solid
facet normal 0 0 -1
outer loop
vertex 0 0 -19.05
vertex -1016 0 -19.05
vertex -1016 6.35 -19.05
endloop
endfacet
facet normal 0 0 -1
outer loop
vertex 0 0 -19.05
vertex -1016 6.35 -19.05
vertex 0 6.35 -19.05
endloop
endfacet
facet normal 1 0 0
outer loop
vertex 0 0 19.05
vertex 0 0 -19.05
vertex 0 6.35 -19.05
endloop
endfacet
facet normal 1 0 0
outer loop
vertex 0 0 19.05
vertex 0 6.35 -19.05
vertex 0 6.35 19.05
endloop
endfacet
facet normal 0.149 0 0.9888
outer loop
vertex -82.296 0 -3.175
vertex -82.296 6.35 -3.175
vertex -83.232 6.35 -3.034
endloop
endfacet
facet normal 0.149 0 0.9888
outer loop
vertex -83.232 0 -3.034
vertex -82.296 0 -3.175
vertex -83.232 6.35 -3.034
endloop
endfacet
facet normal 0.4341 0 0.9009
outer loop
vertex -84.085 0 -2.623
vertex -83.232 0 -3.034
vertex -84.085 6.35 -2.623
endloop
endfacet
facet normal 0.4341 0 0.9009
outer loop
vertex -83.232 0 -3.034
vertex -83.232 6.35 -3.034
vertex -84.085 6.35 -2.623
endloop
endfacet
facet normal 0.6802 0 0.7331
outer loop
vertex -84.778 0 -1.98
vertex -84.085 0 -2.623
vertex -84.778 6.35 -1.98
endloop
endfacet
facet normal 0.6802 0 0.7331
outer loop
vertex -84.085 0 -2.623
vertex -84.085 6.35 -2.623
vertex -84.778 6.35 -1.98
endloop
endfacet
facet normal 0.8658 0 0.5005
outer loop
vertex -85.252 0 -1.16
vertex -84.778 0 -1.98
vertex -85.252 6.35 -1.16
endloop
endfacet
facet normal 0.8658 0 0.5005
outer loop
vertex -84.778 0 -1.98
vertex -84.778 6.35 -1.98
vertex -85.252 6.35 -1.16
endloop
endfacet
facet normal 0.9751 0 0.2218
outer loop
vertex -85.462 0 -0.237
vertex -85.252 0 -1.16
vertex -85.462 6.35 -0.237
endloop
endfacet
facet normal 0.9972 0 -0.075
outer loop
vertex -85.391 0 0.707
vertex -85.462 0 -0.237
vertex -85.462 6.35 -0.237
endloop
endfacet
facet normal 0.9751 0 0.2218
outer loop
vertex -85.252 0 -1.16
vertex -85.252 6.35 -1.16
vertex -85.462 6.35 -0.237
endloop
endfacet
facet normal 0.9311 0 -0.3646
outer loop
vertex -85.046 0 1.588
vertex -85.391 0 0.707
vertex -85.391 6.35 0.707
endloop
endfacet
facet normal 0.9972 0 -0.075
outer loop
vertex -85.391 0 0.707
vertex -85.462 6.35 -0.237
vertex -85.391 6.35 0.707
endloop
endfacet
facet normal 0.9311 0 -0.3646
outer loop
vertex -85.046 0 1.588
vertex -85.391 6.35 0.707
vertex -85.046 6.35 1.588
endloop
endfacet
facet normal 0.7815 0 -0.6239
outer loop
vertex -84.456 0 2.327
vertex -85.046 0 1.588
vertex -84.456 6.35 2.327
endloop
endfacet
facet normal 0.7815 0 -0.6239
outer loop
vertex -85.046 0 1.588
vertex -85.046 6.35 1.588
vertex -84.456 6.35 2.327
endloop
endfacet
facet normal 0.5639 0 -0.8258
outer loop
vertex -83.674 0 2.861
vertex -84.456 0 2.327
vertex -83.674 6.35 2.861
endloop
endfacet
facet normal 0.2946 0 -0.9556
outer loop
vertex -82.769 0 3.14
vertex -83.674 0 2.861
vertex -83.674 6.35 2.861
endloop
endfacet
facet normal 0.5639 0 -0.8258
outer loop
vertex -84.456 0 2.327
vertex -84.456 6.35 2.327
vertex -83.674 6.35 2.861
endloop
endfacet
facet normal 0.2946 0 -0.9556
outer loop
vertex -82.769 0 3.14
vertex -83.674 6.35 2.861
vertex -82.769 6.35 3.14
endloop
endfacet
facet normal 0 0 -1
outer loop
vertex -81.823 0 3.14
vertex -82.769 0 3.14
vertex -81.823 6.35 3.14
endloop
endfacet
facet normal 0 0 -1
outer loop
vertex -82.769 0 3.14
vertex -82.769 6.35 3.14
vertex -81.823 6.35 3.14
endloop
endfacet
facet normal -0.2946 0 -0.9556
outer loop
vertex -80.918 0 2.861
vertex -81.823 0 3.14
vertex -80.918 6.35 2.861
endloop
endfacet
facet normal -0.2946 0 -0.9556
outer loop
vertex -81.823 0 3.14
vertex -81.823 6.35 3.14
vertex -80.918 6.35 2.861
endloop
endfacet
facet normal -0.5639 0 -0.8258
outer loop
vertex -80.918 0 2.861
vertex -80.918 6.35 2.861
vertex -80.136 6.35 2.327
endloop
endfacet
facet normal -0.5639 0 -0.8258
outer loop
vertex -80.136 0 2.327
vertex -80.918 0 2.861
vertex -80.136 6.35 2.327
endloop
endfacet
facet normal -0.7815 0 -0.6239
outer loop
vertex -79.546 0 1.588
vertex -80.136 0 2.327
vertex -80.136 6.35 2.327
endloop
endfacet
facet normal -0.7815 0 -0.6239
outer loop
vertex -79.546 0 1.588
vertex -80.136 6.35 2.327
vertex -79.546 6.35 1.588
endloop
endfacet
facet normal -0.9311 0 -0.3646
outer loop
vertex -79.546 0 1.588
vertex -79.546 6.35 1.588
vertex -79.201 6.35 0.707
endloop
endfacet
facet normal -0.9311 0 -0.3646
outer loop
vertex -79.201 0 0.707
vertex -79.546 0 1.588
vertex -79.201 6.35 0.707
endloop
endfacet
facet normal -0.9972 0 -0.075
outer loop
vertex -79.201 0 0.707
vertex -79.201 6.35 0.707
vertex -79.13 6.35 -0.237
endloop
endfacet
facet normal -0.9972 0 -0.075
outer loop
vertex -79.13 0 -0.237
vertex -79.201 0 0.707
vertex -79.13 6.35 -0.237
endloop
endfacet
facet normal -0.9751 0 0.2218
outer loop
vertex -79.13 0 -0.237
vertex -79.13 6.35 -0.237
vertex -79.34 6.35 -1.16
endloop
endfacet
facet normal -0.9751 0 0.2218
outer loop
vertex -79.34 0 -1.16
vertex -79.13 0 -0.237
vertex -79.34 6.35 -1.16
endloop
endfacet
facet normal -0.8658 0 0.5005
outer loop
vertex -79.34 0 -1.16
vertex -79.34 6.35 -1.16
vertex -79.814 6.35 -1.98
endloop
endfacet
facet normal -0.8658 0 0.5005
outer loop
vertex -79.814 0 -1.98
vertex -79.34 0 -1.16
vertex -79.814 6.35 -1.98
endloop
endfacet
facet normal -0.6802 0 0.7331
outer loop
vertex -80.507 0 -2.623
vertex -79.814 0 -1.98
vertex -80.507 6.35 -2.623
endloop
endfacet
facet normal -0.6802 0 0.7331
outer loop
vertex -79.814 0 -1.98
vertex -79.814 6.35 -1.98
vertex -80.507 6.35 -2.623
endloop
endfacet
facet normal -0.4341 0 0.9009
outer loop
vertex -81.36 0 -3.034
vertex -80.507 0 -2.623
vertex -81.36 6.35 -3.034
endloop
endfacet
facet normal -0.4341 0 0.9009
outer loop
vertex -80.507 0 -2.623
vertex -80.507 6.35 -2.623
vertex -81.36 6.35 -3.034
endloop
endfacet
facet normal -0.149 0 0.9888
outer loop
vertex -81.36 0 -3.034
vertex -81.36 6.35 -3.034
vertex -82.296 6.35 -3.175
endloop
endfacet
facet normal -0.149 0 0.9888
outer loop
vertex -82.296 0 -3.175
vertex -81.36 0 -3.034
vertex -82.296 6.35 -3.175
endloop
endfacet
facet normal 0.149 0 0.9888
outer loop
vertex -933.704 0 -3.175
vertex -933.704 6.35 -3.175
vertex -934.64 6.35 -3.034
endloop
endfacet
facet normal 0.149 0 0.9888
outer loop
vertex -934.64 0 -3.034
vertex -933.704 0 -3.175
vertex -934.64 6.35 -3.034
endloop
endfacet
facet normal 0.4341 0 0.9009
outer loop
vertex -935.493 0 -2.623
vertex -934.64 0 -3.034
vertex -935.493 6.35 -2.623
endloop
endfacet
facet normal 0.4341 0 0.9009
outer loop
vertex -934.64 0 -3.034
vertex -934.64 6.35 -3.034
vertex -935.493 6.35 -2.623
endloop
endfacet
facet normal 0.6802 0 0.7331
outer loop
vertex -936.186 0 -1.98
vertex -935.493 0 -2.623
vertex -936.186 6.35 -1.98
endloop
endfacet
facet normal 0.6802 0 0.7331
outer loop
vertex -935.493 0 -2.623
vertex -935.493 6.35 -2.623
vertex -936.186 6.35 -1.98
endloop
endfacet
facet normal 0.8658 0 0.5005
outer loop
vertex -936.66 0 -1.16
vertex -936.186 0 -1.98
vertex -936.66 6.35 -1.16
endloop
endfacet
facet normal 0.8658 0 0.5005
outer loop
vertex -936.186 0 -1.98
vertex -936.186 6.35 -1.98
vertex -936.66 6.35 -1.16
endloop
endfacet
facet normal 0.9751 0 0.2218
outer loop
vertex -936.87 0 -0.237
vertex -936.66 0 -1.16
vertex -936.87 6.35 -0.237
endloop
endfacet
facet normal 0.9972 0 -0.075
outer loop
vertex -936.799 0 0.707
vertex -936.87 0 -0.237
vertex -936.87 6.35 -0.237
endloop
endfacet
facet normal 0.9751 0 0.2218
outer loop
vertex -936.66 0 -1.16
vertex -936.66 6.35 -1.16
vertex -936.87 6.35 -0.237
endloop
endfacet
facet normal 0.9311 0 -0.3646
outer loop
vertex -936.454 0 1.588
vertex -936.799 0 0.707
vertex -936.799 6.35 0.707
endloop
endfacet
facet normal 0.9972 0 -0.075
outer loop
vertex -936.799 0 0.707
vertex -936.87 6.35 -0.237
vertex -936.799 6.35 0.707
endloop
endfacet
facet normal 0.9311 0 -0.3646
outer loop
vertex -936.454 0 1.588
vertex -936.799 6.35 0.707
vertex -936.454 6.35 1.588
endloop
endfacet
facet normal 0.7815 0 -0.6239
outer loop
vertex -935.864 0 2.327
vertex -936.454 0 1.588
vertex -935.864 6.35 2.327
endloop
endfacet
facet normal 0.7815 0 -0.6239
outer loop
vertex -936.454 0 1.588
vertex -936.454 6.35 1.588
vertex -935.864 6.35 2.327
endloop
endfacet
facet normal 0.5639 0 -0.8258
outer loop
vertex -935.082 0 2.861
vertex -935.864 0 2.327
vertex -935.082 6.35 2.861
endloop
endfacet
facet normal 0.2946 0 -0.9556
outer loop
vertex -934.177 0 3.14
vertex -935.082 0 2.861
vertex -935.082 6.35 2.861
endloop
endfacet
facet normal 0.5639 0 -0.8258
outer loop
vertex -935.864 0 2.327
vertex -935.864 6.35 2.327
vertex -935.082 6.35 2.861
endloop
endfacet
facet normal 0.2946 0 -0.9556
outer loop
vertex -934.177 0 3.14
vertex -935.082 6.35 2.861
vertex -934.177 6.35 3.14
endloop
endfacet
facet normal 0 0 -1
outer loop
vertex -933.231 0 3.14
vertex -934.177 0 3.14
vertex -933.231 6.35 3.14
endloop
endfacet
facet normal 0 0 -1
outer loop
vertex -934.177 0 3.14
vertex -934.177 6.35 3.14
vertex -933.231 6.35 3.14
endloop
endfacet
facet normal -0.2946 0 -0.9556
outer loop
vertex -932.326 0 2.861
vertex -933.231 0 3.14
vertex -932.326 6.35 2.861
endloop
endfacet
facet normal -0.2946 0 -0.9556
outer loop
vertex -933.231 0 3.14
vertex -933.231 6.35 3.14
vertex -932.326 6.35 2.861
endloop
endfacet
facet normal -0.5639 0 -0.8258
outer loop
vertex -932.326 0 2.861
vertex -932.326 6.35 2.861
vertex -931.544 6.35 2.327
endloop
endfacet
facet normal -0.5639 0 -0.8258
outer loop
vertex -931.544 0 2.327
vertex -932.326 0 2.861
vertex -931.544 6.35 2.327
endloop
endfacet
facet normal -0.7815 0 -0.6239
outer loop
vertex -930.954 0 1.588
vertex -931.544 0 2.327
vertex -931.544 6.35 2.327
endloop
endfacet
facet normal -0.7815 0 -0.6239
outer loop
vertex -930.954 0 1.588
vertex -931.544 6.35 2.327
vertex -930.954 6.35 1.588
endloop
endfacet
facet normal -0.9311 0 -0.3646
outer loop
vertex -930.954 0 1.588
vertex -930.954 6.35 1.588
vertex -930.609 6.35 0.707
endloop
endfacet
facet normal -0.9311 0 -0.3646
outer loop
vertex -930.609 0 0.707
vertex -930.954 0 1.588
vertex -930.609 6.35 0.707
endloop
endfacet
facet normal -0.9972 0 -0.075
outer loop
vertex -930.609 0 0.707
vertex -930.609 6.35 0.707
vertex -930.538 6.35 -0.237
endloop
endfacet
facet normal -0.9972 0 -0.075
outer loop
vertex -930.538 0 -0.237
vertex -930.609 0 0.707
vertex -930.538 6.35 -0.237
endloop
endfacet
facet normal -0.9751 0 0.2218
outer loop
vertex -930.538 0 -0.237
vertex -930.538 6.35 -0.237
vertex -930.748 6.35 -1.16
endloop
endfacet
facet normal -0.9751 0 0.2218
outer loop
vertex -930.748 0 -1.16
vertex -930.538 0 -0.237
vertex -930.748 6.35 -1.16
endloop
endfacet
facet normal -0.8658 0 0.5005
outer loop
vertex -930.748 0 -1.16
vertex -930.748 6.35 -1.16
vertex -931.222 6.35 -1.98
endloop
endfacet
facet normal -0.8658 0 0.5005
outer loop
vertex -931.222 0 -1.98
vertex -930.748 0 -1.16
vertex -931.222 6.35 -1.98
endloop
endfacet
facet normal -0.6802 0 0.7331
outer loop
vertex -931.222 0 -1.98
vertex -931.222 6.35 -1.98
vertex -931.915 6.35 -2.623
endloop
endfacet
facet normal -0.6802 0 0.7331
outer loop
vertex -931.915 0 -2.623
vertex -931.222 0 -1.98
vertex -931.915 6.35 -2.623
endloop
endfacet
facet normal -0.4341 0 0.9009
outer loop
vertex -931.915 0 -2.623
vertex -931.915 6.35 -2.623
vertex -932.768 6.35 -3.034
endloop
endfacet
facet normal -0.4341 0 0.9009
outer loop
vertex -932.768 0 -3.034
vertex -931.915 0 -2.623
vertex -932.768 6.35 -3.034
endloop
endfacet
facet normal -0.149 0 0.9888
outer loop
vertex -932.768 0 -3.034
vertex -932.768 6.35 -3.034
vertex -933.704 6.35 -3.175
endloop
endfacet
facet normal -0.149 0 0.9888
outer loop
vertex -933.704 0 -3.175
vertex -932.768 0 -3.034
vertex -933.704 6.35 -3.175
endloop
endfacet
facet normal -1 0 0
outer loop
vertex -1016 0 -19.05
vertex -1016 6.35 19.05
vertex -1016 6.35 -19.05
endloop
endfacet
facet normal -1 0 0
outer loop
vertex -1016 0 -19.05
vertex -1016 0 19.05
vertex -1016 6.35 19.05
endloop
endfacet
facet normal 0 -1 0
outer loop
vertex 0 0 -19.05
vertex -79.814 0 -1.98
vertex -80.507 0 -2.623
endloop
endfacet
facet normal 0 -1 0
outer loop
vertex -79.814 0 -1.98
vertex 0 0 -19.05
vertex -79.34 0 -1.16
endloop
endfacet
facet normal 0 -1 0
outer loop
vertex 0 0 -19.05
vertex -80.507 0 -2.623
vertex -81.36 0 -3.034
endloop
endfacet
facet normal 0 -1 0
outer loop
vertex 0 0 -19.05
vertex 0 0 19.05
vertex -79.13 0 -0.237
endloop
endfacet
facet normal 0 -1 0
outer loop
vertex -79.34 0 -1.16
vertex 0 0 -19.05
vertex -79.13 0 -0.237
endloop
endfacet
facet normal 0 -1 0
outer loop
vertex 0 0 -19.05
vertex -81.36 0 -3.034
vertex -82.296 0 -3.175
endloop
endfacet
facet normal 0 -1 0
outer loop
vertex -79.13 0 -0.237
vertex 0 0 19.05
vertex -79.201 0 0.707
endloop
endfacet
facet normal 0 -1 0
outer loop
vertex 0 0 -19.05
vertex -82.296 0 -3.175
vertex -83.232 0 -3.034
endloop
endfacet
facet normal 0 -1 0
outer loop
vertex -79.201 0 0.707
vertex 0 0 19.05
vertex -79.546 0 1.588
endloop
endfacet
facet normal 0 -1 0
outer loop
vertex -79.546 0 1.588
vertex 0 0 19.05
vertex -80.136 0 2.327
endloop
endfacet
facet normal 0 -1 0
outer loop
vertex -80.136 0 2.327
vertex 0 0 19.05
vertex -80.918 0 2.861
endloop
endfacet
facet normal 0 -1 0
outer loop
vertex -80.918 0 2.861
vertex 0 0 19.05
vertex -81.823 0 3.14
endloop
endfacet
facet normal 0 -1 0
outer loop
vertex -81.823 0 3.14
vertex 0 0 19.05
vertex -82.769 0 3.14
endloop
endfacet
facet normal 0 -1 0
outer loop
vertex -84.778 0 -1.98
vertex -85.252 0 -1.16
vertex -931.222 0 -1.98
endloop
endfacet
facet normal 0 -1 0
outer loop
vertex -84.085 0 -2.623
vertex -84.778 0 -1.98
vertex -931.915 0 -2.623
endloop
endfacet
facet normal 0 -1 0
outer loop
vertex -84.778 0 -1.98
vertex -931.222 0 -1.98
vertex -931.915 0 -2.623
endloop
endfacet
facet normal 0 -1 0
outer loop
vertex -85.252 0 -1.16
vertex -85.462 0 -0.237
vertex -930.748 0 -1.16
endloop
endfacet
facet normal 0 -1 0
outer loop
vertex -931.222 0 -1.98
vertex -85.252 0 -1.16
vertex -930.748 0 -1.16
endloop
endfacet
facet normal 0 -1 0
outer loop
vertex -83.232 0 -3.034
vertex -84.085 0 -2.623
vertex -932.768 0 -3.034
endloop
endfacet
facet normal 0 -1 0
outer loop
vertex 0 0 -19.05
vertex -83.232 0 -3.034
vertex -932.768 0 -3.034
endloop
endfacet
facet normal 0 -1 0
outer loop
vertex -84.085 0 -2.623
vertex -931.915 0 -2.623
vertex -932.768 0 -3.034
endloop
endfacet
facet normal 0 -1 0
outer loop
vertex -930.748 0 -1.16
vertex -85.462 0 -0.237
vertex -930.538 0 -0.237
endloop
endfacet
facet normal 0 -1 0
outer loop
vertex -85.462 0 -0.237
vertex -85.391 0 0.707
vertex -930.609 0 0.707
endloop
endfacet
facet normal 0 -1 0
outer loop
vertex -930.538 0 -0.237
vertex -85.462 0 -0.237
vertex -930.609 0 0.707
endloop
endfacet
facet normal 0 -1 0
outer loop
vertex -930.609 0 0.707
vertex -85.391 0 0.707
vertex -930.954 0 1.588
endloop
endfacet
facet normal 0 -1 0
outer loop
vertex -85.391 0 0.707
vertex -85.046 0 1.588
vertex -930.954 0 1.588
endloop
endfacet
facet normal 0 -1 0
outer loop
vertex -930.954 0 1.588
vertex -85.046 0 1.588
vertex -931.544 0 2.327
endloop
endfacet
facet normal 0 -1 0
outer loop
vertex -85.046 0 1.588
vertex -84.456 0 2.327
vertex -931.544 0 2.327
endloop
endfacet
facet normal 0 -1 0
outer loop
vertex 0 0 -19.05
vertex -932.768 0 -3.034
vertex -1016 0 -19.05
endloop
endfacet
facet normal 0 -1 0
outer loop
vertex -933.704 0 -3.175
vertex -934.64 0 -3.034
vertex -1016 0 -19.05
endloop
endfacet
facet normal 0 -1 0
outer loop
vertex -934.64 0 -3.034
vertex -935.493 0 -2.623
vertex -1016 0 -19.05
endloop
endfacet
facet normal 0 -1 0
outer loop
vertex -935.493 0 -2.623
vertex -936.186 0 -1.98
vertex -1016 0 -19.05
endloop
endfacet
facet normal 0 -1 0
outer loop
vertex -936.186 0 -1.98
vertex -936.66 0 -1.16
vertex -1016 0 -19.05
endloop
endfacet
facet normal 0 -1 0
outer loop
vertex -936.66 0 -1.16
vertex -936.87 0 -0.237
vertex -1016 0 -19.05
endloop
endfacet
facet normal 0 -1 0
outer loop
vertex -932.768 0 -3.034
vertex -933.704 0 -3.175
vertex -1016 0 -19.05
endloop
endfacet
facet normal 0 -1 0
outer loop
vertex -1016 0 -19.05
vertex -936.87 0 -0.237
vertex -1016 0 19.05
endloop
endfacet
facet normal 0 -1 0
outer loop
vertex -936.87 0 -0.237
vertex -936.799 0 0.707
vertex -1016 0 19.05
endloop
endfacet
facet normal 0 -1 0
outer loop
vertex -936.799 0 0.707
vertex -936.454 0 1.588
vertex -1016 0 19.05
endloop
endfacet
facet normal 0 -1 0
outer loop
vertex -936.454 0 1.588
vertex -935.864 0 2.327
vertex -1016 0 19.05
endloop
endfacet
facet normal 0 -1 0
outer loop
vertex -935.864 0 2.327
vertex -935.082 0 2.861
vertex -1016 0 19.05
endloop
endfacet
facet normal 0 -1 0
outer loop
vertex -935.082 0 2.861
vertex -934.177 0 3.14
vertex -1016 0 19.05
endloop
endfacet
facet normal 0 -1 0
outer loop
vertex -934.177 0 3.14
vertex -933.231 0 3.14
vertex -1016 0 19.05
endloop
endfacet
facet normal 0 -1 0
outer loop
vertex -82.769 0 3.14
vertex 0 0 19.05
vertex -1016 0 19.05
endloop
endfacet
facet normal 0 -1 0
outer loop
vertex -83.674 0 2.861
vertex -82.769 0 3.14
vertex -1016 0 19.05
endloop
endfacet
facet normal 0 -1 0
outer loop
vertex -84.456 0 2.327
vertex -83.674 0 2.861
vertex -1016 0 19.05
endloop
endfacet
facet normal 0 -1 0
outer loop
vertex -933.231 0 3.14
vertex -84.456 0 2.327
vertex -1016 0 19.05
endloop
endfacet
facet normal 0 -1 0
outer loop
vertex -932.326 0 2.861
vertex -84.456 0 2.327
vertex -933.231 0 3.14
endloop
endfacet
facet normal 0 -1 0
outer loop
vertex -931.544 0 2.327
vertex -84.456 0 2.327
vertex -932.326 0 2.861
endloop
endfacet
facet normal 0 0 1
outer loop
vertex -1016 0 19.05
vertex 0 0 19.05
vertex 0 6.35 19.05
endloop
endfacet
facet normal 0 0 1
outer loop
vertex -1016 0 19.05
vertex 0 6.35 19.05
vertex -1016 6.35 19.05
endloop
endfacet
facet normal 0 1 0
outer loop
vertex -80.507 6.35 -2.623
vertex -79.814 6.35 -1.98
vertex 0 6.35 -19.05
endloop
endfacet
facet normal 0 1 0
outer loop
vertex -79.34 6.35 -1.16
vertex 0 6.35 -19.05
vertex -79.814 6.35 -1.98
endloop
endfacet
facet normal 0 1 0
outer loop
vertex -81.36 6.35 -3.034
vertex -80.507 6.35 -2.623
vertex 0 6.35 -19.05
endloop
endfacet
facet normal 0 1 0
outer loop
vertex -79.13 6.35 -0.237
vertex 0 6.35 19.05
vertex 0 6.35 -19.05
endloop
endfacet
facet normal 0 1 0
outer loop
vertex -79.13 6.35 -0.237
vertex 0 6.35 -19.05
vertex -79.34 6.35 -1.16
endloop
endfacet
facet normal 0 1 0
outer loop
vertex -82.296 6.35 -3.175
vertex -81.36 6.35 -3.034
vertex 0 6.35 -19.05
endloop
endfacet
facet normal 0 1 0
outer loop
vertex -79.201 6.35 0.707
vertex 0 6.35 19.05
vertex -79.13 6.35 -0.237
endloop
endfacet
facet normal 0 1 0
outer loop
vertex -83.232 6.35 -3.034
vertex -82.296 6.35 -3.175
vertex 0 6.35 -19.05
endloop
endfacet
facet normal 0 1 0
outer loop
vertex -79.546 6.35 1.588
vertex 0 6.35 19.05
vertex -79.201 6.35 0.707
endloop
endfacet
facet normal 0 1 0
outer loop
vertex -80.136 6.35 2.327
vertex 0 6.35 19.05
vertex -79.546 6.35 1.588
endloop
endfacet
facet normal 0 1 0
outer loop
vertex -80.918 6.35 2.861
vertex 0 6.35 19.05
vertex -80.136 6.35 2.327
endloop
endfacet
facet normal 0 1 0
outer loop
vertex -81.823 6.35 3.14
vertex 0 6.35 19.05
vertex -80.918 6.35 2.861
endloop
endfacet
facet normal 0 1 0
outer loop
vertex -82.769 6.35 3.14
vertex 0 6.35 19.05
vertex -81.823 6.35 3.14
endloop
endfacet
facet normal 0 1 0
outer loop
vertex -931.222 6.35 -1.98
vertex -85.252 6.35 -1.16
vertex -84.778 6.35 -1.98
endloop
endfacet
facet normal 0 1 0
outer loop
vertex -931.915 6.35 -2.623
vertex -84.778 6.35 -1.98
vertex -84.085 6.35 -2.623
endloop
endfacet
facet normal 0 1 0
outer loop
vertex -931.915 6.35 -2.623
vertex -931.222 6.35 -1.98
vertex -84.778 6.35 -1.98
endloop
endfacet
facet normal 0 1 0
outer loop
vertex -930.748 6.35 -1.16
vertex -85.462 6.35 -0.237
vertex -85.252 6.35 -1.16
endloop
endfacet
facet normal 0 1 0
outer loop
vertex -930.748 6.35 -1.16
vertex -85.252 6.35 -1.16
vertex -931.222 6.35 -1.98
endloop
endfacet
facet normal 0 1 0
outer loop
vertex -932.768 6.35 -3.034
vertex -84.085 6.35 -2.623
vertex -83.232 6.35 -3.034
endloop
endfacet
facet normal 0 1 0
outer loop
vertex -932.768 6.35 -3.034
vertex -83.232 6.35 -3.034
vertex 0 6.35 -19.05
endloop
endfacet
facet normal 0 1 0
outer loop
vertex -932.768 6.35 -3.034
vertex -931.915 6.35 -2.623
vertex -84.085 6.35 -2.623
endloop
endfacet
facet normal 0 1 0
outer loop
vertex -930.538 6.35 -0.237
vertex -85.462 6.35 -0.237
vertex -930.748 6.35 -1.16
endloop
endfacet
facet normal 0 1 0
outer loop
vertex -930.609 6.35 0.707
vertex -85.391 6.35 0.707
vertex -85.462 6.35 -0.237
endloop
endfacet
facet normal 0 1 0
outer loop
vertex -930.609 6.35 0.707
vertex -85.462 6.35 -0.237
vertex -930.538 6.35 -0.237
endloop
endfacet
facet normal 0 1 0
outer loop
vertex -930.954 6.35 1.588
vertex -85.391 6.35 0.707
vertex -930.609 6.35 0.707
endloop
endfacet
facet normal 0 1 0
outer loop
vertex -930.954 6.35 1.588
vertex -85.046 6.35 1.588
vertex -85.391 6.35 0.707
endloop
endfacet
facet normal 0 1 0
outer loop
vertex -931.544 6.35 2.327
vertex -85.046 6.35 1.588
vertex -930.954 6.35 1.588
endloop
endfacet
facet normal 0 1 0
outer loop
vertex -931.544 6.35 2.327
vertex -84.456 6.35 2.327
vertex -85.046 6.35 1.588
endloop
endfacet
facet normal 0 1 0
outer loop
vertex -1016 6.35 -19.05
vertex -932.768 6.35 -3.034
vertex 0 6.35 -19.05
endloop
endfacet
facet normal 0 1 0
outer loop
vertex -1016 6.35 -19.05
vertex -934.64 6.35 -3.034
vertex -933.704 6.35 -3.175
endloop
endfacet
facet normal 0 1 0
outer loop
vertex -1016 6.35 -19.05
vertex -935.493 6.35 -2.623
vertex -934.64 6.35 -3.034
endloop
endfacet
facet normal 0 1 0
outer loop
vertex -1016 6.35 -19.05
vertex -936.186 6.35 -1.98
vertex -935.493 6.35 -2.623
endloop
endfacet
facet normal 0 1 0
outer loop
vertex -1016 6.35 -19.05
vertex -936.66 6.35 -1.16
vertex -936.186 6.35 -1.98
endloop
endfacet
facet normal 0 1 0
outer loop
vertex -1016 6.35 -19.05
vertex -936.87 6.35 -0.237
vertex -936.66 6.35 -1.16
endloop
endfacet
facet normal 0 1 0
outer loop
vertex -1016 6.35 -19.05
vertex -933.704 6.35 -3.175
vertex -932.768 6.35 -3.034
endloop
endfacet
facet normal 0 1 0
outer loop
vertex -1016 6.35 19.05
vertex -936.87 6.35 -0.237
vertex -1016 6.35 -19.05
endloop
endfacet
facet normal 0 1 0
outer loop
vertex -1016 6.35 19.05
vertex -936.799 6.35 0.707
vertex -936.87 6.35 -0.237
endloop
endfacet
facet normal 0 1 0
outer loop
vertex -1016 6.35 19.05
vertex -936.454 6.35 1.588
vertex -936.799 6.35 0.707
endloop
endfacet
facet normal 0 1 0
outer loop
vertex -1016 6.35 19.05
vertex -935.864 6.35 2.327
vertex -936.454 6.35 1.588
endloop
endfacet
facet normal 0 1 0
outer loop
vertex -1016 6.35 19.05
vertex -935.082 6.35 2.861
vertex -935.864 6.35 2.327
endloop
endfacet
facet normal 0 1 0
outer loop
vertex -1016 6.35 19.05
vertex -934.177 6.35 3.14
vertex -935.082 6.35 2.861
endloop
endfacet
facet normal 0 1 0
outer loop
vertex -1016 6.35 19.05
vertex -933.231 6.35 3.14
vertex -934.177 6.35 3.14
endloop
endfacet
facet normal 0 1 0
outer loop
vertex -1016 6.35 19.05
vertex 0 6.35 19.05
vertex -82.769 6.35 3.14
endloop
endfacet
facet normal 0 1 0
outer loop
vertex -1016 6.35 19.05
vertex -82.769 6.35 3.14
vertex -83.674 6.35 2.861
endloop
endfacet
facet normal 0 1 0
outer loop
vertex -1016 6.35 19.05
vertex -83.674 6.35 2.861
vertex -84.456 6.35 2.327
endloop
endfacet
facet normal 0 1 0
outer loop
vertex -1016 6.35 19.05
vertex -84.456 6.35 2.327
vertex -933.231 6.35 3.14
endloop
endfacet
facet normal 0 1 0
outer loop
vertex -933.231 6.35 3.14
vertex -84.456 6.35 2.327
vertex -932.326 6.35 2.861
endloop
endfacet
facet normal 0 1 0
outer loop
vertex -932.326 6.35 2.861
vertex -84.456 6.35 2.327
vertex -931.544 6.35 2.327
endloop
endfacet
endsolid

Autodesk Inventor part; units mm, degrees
ref_plane "YZ Plane" through (0, 0, 0) normal (1, 0, 0) x (0, 1, 0)
ref_plane "XZ Plane" through (0, 0, 0) normal (0, 1, 0) x (-1, 0, 0)
ref_plane "XY Plane" through (0, 0, 0) normal (0, 0, 1) x (1, 0, 0)
sketch "Sketch1" plane through (0, 0, 0) normal (0, 1, 0) x (-1, 0, 0)
  line L0 (0, 19.05) -> (1016, 19.05)
  line L1 (1016, 19.05) -> (1016, -19.05)
  line L2 (1016, -19.05) -> (0, -19.05)
  line L3 (0, -19.05) -> (0, 19.05)
  line L4 (0, 19.05) -> (1016, -19.05) construction
  line L5 (1016, 19.05) -> (0, -19.05) construction
  line L6 (1219.2, 0) -> (-203.2, 0) projected
  point P0 (0, 0)
  point P1 (508, 0)
  point P2 (0, 0)
  point P3 (82.296, 0)
  point P4 (933.704, 0)
  dimension "d0" = 1016
  dimension "d1" = 38.1
  dimension "d4" = 82.296
  dimension "d5" = 82.296
extrude "Extrusion1" add sketch "Sketch1" along normal blind 6.35
hole "Hole1" at (-933.704, 0, 0) at (-82.296, 0, 0) direction (0, 1, 0) diameter 6.35 end through all
properties part number "Top Brace"
